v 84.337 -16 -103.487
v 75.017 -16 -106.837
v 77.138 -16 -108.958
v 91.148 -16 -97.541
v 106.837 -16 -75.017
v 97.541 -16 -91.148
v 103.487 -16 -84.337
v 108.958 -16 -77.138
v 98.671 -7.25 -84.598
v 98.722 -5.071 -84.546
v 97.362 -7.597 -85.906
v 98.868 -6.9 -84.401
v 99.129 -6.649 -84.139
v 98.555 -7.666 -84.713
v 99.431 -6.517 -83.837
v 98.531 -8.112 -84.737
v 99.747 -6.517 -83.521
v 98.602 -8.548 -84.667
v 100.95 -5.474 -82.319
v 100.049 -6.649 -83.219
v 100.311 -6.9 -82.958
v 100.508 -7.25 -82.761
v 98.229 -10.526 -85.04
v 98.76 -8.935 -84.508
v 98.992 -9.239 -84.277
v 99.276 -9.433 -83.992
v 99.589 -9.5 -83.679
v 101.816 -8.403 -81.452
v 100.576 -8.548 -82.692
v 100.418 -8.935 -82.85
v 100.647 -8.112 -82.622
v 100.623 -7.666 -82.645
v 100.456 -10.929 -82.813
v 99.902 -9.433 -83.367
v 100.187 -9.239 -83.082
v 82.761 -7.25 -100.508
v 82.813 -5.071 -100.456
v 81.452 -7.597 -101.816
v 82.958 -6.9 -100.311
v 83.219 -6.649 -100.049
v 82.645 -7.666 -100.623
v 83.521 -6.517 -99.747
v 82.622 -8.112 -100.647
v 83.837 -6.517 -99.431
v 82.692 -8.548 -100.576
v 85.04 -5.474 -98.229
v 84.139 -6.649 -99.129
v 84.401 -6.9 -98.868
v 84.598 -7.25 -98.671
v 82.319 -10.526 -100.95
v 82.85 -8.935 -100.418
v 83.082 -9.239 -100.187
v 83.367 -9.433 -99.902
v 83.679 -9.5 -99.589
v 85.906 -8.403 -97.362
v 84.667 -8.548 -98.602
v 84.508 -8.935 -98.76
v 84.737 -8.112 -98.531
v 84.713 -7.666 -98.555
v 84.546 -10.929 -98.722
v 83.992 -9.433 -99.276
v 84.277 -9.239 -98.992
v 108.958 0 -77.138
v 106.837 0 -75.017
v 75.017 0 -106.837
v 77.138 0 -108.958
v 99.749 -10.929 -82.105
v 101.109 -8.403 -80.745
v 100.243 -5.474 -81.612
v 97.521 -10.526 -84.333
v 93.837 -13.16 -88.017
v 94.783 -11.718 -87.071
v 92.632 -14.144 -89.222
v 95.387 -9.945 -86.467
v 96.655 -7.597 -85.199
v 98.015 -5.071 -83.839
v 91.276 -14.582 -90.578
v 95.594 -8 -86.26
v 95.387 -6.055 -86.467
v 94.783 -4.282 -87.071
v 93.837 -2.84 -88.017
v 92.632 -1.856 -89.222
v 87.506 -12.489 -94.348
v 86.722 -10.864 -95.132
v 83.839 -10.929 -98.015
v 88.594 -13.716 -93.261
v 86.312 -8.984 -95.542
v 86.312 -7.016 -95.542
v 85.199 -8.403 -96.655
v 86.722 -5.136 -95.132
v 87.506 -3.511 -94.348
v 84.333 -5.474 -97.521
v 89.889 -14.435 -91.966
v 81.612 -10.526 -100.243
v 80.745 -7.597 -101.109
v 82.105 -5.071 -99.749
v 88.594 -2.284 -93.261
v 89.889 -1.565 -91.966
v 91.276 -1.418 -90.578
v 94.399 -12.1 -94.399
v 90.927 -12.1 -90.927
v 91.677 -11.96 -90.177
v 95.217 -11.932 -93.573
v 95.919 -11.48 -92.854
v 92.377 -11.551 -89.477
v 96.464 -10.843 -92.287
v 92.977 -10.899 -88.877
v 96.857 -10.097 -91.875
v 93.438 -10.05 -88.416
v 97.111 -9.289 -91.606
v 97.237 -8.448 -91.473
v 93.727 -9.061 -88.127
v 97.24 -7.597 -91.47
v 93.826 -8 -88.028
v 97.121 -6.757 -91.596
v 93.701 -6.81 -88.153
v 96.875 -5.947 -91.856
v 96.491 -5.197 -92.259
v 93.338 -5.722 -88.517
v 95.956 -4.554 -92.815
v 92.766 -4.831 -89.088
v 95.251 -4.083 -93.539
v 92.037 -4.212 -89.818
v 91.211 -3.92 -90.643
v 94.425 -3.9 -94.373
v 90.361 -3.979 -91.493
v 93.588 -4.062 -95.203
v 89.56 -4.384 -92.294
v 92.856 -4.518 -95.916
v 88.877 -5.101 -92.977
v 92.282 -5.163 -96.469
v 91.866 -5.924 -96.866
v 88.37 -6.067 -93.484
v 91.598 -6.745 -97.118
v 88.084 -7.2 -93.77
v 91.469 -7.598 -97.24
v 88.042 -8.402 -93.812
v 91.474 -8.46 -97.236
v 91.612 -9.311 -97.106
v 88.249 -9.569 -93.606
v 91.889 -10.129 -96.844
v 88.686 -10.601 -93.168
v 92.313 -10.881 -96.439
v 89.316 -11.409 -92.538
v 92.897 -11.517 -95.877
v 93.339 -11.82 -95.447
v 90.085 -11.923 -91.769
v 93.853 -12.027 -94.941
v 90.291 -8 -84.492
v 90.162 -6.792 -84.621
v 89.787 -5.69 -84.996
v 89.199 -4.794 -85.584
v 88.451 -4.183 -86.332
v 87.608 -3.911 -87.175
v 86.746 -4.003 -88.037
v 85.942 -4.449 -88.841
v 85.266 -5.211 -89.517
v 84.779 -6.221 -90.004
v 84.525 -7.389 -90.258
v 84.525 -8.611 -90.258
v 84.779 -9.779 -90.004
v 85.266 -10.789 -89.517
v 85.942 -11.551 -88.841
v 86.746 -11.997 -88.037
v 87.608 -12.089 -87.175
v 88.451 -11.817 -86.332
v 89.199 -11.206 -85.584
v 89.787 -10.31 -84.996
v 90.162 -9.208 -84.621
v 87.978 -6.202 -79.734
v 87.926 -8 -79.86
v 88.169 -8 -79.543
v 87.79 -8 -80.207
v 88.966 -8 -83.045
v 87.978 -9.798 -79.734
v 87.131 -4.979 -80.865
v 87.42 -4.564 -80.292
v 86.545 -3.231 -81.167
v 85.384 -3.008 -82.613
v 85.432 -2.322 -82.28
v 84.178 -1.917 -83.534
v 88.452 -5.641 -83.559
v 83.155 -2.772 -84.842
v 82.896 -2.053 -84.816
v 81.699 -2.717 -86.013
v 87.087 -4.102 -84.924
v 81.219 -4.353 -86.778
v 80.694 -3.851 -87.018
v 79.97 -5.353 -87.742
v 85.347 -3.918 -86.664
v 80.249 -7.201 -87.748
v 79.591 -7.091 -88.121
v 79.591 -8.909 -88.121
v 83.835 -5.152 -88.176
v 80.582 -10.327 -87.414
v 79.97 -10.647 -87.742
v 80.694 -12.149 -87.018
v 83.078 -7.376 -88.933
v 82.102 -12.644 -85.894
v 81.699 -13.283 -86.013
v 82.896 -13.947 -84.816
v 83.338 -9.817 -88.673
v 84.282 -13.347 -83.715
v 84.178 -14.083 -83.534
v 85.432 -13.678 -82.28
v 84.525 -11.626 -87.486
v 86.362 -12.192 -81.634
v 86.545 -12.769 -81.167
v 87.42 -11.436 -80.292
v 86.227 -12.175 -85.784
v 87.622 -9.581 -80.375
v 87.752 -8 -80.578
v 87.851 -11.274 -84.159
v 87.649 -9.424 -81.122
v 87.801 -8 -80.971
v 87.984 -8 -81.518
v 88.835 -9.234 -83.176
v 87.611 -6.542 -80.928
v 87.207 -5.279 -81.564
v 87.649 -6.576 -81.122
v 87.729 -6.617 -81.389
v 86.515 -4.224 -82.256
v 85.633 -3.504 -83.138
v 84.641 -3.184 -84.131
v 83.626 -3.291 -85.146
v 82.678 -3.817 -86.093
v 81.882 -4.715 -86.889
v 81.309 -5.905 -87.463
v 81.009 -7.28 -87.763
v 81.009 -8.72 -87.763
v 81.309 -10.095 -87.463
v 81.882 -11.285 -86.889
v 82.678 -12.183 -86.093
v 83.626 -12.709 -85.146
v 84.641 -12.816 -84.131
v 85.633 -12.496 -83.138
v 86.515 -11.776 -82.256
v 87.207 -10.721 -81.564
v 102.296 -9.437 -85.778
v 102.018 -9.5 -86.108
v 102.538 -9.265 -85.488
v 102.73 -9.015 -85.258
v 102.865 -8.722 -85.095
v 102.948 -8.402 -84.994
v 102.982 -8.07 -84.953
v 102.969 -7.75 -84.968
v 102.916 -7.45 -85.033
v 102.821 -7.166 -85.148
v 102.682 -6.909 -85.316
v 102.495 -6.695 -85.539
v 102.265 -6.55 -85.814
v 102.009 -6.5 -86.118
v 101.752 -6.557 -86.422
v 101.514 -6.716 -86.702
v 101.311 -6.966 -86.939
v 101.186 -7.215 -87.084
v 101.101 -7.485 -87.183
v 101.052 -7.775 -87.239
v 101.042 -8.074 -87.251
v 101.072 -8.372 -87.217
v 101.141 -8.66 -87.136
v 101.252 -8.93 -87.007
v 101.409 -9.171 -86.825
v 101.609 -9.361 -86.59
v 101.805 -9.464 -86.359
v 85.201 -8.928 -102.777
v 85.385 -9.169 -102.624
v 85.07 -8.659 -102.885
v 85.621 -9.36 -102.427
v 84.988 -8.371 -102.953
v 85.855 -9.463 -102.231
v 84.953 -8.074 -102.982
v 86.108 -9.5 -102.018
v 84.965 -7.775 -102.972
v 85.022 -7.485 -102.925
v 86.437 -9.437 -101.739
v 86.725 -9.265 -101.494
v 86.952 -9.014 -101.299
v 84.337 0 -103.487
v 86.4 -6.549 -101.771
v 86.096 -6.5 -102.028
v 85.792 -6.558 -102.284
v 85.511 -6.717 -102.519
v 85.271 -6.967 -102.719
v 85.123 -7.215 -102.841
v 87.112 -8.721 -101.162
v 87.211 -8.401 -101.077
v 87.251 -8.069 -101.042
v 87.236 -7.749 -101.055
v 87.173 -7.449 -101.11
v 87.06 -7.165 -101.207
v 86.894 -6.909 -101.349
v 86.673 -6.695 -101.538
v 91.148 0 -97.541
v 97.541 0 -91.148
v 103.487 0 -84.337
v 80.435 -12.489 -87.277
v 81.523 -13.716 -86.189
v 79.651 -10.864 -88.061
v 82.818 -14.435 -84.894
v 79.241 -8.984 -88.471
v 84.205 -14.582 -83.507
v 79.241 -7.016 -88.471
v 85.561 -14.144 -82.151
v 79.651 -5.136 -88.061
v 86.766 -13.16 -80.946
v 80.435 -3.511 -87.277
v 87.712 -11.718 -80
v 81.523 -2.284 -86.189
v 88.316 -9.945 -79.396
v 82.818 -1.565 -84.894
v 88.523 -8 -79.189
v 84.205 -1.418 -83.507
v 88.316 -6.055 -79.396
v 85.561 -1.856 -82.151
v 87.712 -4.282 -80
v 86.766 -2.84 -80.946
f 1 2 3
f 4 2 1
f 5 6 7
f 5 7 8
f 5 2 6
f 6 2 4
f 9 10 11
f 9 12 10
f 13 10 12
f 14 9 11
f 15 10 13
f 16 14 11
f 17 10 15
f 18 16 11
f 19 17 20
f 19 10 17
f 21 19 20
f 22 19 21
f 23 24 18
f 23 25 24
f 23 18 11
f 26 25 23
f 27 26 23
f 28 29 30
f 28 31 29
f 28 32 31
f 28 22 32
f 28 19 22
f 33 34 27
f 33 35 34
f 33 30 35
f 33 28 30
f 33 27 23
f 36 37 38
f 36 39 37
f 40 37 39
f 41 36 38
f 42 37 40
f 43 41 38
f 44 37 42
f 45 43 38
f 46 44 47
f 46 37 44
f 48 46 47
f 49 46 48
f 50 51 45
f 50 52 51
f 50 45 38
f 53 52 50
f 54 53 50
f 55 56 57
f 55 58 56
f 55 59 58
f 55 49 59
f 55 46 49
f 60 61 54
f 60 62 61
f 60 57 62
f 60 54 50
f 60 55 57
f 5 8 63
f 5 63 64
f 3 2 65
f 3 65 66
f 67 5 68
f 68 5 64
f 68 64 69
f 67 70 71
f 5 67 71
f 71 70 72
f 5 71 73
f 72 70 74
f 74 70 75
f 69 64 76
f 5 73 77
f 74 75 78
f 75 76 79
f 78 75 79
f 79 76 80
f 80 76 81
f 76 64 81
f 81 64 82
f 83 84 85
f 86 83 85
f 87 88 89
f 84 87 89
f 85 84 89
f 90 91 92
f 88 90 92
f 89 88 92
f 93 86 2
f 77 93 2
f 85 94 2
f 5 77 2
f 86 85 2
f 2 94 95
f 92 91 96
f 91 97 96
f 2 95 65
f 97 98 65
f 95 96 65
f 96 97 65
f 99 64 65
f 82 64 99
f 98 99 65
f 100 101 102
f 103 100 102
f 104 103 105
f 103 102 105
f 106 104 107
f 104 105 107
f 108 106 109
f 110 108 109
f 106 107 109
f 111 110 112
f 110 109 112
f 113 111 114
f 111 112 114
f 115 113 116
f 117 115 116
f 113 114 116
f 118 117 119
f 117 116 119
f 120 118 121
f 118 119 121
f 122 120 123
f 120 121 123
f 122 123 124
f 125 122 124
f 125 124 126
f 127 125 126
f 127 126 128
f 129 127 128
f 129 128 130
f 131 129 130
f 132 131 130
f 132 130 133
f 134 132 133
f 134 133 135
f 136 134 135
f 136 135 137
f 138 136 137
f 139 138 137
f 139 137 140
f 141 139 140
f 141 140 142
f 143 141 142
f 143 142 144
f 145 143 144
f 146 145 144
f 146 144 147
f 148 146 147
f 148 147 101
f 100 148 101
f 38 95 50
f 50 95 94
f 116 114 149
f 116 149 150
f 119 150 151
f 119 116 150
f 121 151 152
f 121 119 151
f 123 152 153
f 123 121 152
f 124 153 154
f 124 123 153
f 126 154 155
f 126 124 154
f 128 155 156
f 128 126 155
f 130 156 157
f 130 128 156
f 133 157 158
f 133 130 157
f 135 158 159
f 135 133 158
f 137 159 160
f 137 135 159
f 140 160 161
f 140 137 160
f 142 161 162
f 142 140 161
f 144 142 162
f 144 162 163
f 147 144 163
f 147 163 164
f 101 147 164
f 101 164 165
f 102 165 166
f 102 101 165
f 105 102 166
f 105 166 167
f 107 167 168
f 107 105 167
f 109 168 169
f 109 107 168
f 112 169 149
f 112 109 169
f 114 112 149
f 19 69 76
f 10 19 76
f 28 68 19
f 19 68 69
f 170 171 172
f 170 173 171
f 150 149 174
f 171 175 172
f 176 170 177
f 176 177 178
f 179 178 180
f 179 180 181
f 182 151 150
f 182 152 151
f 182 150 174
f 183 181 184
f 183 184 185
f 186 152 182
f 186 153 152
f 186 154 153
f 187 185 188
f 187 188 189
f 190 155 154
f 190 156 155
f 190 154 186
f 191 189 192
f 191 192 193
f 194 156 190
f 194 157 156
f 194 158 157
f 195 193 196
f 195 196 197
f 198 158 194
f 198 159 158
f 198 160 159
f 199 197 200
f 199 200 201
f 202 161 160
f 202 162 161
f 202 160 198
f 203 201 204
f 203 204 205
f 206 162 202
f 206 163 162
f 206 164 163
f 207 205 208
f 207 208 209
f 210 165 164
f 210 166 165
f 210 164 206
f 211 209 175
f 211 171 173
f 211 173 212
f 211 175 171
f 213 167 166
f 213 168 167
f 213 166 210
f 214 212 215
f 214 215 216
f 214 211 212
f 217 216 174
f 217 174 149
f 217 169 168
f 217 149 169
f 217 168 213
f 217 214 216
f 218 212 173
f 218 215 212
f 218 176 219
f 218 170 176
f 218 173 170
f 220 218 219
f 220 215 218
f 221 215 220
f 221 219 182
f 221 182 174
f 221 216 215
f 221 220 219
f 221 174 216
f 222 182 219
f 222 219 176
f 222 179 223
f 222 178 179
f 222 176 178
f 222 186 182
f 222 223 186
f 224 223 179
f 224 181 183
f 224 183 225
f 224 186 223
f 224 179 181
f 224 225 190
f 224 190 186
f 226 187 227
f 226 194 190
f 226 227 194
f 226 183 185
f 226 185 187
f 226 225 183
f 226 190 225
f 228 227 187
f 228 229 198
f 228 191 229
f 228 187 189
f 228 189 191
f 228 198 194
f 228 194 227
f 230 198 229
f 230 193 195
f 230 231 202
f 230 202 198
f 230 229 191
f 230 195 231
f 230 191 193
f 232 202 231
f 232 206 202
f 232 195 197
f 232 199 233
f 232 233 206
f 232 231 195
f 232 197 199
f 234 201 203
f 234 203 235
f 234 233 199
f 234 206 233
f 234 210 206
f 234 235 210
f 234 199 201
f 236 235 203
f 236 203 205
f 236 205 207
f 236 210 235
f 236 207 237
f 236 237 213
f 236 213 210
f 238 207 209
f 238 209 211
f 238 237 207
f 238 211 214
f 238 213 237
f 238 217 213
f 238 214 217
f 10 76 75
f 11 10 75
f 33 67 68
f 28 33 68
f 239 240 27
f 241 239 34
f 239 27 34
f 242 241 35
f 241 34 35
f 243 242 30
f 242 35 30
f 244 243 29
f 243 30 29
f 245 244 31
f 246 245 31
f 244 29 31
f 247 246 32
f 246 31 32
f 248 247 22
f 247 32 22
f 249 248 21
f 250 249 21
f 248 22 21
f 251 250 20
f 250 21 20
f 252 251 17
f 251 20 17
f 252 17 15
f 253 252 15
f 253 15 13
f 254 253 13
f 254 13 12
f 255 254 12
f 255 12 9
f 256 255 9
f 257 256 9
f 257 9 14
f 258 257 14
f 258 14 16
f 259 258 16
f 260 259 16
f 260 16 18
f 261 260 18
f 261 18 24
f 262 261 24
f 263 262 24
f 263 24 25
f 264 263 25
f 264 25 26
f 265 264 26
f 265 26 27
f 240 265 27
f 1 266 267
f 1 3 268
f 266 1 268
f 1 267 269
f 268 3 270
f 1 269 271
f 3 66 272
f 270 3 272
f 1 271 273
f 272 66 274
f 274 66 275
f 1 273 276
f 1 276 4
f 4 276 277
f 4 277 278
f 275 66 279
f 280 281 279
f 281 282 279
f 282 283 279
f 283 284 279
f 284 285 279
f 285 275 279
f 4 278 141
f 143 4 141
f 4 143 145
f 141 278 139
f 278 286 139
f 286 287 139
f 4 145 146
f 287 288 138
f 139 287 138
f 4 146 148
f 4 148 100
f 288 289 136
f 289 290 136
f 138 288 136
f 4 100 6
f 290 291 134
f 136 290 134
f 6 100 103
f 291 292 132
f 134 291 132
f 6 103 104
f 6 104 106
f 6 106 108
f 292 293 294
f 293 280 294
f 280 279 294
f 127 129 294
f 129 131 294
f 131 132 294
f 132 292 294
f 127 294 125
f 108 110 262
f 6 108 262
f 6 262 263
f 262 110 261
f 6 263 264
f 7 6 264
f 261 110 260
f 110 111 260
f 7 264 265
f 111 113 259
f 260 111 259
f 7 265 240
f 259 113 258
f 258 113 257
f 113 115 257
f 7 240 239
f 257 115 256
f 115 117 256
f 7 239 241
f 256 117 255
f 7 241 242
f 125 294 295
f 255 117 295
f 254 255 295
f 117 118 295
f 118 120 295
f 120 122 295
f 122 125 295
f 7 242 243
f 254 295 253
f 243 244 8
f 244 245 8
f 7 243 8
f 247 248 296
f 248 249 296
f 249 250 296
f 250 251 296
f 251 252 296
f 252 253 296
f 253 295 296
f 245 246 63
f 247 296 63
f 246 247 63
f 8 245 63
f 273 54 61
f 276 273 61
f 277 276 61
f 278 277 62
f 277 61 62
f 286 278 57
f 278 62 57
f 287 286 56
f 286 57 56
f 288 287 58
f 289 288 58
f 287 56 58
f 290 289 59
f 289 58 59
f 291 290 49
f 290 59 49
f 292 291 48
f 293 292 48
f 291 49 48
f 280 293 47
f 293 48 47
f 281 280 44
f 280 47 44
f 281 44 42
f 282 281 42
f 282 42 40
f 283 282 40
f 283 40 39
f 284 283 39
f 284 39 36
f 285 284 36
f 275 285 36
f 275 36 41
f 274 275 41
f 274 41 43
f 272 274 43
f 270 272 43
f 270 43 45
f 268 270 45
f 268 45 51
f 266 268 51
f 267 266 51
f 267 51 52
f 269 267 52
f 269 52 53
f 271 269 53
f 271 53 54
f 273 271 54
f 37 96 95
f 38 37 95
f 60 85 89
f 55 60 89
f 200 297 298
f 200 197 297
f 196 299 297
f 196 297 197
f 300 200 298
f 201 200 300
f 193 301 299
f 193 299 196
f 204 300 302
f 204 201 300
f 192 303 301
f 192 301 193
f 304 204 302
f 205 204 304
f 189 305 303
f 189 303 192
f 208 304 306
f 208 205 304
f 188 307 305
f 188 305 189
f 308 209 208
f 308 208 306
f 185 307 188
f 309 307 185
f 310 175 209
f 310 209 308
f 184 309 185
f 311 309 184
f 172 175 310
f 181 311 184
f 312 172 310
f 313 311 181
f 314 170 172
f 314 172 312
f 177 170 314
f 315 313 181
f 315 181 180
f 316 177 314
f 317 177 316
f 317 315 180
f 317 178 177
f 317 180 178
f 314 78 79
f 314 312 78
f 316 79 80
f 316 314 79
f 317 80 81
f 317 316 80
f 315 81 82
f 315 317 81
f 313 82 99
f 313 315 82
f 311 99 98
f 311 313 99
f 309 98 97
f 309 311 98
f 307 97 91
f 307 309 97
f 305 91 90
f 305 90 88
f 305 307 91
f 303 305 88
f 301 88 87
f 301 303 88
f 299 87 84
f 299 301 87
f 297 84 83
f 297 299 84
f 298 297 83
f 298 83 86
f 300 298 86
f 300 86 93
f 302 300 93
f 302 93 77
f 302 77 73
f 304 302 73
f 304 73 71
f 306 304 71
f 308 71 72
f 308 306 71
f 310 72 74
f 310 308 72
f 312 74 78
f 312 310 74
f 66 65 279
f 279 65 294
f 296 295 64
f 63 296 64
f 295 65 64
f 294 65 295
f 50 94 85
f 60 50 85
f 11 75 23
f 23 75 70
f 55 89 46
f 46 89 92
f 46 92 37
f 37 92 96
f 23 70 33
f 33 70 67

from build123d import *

# Parameters (mm, degrees)
F1_DEPTH = 16
F2_R     = 1.5
F2_R_2   = 4.1
F3_DEPTH = 25.501
F5_DEPTH = 1


with BuildPart() as f1:
    # F0 (on Front) → F1 (new body)
    with BuildSketch(Plane.XZ):
        with BuildLine():
            ThreePointArc((77.1384719389, -108.9582770923), (94.3987552884, -94.3987552884), (108.9582770923, -77.1384719389))
            Line((108.9582770923, -77.1384719389), (106.8369567488, -75.0171515954))
            Line((106.8369567488, -75.0171515954), (75.0171515954, -106.8369567488))
            Line((75.0171515954, -106.8369567488), (77.1384719389, -108.9582770923))
        make_face()
    extrude(amount=F1_DEPTH)

    # F2 (on face) → F3 (cut, through all)
    with BuildSketch(Plane(origin=(90.9270541721, 0, -90.9270541721), x_dir=(0, -1, 0), z_dir=(-0.7071067812, 0, 0.7071067812))):
        with Locations((8, 11.25)):
            Circle(F2_R)
        with Locations((8, 0)):
            Circle(F2_R_2)
        with Locations((8, -11.25)):
            Circle(F2_R)
    extrude(amount=-F3_DEPTH, mode=Mode.SUBTRACT)

    # F4 (on face) → F5 (cut)
    with BuildSketch(Plane(origin=(90.9270541721, 0, -90.9270541721), x_dir=(0, -1, 0), z_dir=(-0.7071067812, 0, 0.7071067812))):
        Polygon((7.5967662116, 8.100280037), (10.5261206085, 9.3259293141), (10.929354397, 12.475649277), (8.4032337884, 14.399719963), (5.4738793915, 13.1740706859), (5.070645603, 10.024350723), align=None)
        Polygon((5.070645603, -12.475649277), (7.5967662116, -14.399719963), (10.5261206085, -13.1740706859), (10.929354397, -10.024350723), (8.4032337884, -8.100280037), (5.4738793915, -9.3259293141), align=None)
    extrude(amount=-F5_DEPTH, mode=Mode.SUBTRACT)

    # F7 (on mid) → F8 (revolve)
    with BuildSketch(Plane.XZ.offset(8)):
        with BuildLine():
            Line((88.522891116, -79.1890816044), (88.1693377254, -79.542634995))
            add(Edge.make_bspline(
                [(88.1693377254, -79.542634995), (86.9168482293, -80.7951244911), (88.7321185884, -82.9338429826), (90.290658069, -84.4923824633)],
                knots=[0, 0, 0, 0, 5.3851648071, 5.3851648071, 5.3851648071, 5.3851648071], degree=3))
            Line((90.290658069, -84.4923824633), (93.8261919749, -88.0279163692))
            Line((93.8261919749, -88.0279163692), (95.5939589279, -86.2601494162))
            Line((95.5939589279, -86.2601494162), (88.522891116, -79.1890816044))
        make_face()
    revolve(axis=Axis((87.3915202661, -8, -87.3915202661), (-0.7071067812, 0, 0.7071067812)))


solid = f1.part
